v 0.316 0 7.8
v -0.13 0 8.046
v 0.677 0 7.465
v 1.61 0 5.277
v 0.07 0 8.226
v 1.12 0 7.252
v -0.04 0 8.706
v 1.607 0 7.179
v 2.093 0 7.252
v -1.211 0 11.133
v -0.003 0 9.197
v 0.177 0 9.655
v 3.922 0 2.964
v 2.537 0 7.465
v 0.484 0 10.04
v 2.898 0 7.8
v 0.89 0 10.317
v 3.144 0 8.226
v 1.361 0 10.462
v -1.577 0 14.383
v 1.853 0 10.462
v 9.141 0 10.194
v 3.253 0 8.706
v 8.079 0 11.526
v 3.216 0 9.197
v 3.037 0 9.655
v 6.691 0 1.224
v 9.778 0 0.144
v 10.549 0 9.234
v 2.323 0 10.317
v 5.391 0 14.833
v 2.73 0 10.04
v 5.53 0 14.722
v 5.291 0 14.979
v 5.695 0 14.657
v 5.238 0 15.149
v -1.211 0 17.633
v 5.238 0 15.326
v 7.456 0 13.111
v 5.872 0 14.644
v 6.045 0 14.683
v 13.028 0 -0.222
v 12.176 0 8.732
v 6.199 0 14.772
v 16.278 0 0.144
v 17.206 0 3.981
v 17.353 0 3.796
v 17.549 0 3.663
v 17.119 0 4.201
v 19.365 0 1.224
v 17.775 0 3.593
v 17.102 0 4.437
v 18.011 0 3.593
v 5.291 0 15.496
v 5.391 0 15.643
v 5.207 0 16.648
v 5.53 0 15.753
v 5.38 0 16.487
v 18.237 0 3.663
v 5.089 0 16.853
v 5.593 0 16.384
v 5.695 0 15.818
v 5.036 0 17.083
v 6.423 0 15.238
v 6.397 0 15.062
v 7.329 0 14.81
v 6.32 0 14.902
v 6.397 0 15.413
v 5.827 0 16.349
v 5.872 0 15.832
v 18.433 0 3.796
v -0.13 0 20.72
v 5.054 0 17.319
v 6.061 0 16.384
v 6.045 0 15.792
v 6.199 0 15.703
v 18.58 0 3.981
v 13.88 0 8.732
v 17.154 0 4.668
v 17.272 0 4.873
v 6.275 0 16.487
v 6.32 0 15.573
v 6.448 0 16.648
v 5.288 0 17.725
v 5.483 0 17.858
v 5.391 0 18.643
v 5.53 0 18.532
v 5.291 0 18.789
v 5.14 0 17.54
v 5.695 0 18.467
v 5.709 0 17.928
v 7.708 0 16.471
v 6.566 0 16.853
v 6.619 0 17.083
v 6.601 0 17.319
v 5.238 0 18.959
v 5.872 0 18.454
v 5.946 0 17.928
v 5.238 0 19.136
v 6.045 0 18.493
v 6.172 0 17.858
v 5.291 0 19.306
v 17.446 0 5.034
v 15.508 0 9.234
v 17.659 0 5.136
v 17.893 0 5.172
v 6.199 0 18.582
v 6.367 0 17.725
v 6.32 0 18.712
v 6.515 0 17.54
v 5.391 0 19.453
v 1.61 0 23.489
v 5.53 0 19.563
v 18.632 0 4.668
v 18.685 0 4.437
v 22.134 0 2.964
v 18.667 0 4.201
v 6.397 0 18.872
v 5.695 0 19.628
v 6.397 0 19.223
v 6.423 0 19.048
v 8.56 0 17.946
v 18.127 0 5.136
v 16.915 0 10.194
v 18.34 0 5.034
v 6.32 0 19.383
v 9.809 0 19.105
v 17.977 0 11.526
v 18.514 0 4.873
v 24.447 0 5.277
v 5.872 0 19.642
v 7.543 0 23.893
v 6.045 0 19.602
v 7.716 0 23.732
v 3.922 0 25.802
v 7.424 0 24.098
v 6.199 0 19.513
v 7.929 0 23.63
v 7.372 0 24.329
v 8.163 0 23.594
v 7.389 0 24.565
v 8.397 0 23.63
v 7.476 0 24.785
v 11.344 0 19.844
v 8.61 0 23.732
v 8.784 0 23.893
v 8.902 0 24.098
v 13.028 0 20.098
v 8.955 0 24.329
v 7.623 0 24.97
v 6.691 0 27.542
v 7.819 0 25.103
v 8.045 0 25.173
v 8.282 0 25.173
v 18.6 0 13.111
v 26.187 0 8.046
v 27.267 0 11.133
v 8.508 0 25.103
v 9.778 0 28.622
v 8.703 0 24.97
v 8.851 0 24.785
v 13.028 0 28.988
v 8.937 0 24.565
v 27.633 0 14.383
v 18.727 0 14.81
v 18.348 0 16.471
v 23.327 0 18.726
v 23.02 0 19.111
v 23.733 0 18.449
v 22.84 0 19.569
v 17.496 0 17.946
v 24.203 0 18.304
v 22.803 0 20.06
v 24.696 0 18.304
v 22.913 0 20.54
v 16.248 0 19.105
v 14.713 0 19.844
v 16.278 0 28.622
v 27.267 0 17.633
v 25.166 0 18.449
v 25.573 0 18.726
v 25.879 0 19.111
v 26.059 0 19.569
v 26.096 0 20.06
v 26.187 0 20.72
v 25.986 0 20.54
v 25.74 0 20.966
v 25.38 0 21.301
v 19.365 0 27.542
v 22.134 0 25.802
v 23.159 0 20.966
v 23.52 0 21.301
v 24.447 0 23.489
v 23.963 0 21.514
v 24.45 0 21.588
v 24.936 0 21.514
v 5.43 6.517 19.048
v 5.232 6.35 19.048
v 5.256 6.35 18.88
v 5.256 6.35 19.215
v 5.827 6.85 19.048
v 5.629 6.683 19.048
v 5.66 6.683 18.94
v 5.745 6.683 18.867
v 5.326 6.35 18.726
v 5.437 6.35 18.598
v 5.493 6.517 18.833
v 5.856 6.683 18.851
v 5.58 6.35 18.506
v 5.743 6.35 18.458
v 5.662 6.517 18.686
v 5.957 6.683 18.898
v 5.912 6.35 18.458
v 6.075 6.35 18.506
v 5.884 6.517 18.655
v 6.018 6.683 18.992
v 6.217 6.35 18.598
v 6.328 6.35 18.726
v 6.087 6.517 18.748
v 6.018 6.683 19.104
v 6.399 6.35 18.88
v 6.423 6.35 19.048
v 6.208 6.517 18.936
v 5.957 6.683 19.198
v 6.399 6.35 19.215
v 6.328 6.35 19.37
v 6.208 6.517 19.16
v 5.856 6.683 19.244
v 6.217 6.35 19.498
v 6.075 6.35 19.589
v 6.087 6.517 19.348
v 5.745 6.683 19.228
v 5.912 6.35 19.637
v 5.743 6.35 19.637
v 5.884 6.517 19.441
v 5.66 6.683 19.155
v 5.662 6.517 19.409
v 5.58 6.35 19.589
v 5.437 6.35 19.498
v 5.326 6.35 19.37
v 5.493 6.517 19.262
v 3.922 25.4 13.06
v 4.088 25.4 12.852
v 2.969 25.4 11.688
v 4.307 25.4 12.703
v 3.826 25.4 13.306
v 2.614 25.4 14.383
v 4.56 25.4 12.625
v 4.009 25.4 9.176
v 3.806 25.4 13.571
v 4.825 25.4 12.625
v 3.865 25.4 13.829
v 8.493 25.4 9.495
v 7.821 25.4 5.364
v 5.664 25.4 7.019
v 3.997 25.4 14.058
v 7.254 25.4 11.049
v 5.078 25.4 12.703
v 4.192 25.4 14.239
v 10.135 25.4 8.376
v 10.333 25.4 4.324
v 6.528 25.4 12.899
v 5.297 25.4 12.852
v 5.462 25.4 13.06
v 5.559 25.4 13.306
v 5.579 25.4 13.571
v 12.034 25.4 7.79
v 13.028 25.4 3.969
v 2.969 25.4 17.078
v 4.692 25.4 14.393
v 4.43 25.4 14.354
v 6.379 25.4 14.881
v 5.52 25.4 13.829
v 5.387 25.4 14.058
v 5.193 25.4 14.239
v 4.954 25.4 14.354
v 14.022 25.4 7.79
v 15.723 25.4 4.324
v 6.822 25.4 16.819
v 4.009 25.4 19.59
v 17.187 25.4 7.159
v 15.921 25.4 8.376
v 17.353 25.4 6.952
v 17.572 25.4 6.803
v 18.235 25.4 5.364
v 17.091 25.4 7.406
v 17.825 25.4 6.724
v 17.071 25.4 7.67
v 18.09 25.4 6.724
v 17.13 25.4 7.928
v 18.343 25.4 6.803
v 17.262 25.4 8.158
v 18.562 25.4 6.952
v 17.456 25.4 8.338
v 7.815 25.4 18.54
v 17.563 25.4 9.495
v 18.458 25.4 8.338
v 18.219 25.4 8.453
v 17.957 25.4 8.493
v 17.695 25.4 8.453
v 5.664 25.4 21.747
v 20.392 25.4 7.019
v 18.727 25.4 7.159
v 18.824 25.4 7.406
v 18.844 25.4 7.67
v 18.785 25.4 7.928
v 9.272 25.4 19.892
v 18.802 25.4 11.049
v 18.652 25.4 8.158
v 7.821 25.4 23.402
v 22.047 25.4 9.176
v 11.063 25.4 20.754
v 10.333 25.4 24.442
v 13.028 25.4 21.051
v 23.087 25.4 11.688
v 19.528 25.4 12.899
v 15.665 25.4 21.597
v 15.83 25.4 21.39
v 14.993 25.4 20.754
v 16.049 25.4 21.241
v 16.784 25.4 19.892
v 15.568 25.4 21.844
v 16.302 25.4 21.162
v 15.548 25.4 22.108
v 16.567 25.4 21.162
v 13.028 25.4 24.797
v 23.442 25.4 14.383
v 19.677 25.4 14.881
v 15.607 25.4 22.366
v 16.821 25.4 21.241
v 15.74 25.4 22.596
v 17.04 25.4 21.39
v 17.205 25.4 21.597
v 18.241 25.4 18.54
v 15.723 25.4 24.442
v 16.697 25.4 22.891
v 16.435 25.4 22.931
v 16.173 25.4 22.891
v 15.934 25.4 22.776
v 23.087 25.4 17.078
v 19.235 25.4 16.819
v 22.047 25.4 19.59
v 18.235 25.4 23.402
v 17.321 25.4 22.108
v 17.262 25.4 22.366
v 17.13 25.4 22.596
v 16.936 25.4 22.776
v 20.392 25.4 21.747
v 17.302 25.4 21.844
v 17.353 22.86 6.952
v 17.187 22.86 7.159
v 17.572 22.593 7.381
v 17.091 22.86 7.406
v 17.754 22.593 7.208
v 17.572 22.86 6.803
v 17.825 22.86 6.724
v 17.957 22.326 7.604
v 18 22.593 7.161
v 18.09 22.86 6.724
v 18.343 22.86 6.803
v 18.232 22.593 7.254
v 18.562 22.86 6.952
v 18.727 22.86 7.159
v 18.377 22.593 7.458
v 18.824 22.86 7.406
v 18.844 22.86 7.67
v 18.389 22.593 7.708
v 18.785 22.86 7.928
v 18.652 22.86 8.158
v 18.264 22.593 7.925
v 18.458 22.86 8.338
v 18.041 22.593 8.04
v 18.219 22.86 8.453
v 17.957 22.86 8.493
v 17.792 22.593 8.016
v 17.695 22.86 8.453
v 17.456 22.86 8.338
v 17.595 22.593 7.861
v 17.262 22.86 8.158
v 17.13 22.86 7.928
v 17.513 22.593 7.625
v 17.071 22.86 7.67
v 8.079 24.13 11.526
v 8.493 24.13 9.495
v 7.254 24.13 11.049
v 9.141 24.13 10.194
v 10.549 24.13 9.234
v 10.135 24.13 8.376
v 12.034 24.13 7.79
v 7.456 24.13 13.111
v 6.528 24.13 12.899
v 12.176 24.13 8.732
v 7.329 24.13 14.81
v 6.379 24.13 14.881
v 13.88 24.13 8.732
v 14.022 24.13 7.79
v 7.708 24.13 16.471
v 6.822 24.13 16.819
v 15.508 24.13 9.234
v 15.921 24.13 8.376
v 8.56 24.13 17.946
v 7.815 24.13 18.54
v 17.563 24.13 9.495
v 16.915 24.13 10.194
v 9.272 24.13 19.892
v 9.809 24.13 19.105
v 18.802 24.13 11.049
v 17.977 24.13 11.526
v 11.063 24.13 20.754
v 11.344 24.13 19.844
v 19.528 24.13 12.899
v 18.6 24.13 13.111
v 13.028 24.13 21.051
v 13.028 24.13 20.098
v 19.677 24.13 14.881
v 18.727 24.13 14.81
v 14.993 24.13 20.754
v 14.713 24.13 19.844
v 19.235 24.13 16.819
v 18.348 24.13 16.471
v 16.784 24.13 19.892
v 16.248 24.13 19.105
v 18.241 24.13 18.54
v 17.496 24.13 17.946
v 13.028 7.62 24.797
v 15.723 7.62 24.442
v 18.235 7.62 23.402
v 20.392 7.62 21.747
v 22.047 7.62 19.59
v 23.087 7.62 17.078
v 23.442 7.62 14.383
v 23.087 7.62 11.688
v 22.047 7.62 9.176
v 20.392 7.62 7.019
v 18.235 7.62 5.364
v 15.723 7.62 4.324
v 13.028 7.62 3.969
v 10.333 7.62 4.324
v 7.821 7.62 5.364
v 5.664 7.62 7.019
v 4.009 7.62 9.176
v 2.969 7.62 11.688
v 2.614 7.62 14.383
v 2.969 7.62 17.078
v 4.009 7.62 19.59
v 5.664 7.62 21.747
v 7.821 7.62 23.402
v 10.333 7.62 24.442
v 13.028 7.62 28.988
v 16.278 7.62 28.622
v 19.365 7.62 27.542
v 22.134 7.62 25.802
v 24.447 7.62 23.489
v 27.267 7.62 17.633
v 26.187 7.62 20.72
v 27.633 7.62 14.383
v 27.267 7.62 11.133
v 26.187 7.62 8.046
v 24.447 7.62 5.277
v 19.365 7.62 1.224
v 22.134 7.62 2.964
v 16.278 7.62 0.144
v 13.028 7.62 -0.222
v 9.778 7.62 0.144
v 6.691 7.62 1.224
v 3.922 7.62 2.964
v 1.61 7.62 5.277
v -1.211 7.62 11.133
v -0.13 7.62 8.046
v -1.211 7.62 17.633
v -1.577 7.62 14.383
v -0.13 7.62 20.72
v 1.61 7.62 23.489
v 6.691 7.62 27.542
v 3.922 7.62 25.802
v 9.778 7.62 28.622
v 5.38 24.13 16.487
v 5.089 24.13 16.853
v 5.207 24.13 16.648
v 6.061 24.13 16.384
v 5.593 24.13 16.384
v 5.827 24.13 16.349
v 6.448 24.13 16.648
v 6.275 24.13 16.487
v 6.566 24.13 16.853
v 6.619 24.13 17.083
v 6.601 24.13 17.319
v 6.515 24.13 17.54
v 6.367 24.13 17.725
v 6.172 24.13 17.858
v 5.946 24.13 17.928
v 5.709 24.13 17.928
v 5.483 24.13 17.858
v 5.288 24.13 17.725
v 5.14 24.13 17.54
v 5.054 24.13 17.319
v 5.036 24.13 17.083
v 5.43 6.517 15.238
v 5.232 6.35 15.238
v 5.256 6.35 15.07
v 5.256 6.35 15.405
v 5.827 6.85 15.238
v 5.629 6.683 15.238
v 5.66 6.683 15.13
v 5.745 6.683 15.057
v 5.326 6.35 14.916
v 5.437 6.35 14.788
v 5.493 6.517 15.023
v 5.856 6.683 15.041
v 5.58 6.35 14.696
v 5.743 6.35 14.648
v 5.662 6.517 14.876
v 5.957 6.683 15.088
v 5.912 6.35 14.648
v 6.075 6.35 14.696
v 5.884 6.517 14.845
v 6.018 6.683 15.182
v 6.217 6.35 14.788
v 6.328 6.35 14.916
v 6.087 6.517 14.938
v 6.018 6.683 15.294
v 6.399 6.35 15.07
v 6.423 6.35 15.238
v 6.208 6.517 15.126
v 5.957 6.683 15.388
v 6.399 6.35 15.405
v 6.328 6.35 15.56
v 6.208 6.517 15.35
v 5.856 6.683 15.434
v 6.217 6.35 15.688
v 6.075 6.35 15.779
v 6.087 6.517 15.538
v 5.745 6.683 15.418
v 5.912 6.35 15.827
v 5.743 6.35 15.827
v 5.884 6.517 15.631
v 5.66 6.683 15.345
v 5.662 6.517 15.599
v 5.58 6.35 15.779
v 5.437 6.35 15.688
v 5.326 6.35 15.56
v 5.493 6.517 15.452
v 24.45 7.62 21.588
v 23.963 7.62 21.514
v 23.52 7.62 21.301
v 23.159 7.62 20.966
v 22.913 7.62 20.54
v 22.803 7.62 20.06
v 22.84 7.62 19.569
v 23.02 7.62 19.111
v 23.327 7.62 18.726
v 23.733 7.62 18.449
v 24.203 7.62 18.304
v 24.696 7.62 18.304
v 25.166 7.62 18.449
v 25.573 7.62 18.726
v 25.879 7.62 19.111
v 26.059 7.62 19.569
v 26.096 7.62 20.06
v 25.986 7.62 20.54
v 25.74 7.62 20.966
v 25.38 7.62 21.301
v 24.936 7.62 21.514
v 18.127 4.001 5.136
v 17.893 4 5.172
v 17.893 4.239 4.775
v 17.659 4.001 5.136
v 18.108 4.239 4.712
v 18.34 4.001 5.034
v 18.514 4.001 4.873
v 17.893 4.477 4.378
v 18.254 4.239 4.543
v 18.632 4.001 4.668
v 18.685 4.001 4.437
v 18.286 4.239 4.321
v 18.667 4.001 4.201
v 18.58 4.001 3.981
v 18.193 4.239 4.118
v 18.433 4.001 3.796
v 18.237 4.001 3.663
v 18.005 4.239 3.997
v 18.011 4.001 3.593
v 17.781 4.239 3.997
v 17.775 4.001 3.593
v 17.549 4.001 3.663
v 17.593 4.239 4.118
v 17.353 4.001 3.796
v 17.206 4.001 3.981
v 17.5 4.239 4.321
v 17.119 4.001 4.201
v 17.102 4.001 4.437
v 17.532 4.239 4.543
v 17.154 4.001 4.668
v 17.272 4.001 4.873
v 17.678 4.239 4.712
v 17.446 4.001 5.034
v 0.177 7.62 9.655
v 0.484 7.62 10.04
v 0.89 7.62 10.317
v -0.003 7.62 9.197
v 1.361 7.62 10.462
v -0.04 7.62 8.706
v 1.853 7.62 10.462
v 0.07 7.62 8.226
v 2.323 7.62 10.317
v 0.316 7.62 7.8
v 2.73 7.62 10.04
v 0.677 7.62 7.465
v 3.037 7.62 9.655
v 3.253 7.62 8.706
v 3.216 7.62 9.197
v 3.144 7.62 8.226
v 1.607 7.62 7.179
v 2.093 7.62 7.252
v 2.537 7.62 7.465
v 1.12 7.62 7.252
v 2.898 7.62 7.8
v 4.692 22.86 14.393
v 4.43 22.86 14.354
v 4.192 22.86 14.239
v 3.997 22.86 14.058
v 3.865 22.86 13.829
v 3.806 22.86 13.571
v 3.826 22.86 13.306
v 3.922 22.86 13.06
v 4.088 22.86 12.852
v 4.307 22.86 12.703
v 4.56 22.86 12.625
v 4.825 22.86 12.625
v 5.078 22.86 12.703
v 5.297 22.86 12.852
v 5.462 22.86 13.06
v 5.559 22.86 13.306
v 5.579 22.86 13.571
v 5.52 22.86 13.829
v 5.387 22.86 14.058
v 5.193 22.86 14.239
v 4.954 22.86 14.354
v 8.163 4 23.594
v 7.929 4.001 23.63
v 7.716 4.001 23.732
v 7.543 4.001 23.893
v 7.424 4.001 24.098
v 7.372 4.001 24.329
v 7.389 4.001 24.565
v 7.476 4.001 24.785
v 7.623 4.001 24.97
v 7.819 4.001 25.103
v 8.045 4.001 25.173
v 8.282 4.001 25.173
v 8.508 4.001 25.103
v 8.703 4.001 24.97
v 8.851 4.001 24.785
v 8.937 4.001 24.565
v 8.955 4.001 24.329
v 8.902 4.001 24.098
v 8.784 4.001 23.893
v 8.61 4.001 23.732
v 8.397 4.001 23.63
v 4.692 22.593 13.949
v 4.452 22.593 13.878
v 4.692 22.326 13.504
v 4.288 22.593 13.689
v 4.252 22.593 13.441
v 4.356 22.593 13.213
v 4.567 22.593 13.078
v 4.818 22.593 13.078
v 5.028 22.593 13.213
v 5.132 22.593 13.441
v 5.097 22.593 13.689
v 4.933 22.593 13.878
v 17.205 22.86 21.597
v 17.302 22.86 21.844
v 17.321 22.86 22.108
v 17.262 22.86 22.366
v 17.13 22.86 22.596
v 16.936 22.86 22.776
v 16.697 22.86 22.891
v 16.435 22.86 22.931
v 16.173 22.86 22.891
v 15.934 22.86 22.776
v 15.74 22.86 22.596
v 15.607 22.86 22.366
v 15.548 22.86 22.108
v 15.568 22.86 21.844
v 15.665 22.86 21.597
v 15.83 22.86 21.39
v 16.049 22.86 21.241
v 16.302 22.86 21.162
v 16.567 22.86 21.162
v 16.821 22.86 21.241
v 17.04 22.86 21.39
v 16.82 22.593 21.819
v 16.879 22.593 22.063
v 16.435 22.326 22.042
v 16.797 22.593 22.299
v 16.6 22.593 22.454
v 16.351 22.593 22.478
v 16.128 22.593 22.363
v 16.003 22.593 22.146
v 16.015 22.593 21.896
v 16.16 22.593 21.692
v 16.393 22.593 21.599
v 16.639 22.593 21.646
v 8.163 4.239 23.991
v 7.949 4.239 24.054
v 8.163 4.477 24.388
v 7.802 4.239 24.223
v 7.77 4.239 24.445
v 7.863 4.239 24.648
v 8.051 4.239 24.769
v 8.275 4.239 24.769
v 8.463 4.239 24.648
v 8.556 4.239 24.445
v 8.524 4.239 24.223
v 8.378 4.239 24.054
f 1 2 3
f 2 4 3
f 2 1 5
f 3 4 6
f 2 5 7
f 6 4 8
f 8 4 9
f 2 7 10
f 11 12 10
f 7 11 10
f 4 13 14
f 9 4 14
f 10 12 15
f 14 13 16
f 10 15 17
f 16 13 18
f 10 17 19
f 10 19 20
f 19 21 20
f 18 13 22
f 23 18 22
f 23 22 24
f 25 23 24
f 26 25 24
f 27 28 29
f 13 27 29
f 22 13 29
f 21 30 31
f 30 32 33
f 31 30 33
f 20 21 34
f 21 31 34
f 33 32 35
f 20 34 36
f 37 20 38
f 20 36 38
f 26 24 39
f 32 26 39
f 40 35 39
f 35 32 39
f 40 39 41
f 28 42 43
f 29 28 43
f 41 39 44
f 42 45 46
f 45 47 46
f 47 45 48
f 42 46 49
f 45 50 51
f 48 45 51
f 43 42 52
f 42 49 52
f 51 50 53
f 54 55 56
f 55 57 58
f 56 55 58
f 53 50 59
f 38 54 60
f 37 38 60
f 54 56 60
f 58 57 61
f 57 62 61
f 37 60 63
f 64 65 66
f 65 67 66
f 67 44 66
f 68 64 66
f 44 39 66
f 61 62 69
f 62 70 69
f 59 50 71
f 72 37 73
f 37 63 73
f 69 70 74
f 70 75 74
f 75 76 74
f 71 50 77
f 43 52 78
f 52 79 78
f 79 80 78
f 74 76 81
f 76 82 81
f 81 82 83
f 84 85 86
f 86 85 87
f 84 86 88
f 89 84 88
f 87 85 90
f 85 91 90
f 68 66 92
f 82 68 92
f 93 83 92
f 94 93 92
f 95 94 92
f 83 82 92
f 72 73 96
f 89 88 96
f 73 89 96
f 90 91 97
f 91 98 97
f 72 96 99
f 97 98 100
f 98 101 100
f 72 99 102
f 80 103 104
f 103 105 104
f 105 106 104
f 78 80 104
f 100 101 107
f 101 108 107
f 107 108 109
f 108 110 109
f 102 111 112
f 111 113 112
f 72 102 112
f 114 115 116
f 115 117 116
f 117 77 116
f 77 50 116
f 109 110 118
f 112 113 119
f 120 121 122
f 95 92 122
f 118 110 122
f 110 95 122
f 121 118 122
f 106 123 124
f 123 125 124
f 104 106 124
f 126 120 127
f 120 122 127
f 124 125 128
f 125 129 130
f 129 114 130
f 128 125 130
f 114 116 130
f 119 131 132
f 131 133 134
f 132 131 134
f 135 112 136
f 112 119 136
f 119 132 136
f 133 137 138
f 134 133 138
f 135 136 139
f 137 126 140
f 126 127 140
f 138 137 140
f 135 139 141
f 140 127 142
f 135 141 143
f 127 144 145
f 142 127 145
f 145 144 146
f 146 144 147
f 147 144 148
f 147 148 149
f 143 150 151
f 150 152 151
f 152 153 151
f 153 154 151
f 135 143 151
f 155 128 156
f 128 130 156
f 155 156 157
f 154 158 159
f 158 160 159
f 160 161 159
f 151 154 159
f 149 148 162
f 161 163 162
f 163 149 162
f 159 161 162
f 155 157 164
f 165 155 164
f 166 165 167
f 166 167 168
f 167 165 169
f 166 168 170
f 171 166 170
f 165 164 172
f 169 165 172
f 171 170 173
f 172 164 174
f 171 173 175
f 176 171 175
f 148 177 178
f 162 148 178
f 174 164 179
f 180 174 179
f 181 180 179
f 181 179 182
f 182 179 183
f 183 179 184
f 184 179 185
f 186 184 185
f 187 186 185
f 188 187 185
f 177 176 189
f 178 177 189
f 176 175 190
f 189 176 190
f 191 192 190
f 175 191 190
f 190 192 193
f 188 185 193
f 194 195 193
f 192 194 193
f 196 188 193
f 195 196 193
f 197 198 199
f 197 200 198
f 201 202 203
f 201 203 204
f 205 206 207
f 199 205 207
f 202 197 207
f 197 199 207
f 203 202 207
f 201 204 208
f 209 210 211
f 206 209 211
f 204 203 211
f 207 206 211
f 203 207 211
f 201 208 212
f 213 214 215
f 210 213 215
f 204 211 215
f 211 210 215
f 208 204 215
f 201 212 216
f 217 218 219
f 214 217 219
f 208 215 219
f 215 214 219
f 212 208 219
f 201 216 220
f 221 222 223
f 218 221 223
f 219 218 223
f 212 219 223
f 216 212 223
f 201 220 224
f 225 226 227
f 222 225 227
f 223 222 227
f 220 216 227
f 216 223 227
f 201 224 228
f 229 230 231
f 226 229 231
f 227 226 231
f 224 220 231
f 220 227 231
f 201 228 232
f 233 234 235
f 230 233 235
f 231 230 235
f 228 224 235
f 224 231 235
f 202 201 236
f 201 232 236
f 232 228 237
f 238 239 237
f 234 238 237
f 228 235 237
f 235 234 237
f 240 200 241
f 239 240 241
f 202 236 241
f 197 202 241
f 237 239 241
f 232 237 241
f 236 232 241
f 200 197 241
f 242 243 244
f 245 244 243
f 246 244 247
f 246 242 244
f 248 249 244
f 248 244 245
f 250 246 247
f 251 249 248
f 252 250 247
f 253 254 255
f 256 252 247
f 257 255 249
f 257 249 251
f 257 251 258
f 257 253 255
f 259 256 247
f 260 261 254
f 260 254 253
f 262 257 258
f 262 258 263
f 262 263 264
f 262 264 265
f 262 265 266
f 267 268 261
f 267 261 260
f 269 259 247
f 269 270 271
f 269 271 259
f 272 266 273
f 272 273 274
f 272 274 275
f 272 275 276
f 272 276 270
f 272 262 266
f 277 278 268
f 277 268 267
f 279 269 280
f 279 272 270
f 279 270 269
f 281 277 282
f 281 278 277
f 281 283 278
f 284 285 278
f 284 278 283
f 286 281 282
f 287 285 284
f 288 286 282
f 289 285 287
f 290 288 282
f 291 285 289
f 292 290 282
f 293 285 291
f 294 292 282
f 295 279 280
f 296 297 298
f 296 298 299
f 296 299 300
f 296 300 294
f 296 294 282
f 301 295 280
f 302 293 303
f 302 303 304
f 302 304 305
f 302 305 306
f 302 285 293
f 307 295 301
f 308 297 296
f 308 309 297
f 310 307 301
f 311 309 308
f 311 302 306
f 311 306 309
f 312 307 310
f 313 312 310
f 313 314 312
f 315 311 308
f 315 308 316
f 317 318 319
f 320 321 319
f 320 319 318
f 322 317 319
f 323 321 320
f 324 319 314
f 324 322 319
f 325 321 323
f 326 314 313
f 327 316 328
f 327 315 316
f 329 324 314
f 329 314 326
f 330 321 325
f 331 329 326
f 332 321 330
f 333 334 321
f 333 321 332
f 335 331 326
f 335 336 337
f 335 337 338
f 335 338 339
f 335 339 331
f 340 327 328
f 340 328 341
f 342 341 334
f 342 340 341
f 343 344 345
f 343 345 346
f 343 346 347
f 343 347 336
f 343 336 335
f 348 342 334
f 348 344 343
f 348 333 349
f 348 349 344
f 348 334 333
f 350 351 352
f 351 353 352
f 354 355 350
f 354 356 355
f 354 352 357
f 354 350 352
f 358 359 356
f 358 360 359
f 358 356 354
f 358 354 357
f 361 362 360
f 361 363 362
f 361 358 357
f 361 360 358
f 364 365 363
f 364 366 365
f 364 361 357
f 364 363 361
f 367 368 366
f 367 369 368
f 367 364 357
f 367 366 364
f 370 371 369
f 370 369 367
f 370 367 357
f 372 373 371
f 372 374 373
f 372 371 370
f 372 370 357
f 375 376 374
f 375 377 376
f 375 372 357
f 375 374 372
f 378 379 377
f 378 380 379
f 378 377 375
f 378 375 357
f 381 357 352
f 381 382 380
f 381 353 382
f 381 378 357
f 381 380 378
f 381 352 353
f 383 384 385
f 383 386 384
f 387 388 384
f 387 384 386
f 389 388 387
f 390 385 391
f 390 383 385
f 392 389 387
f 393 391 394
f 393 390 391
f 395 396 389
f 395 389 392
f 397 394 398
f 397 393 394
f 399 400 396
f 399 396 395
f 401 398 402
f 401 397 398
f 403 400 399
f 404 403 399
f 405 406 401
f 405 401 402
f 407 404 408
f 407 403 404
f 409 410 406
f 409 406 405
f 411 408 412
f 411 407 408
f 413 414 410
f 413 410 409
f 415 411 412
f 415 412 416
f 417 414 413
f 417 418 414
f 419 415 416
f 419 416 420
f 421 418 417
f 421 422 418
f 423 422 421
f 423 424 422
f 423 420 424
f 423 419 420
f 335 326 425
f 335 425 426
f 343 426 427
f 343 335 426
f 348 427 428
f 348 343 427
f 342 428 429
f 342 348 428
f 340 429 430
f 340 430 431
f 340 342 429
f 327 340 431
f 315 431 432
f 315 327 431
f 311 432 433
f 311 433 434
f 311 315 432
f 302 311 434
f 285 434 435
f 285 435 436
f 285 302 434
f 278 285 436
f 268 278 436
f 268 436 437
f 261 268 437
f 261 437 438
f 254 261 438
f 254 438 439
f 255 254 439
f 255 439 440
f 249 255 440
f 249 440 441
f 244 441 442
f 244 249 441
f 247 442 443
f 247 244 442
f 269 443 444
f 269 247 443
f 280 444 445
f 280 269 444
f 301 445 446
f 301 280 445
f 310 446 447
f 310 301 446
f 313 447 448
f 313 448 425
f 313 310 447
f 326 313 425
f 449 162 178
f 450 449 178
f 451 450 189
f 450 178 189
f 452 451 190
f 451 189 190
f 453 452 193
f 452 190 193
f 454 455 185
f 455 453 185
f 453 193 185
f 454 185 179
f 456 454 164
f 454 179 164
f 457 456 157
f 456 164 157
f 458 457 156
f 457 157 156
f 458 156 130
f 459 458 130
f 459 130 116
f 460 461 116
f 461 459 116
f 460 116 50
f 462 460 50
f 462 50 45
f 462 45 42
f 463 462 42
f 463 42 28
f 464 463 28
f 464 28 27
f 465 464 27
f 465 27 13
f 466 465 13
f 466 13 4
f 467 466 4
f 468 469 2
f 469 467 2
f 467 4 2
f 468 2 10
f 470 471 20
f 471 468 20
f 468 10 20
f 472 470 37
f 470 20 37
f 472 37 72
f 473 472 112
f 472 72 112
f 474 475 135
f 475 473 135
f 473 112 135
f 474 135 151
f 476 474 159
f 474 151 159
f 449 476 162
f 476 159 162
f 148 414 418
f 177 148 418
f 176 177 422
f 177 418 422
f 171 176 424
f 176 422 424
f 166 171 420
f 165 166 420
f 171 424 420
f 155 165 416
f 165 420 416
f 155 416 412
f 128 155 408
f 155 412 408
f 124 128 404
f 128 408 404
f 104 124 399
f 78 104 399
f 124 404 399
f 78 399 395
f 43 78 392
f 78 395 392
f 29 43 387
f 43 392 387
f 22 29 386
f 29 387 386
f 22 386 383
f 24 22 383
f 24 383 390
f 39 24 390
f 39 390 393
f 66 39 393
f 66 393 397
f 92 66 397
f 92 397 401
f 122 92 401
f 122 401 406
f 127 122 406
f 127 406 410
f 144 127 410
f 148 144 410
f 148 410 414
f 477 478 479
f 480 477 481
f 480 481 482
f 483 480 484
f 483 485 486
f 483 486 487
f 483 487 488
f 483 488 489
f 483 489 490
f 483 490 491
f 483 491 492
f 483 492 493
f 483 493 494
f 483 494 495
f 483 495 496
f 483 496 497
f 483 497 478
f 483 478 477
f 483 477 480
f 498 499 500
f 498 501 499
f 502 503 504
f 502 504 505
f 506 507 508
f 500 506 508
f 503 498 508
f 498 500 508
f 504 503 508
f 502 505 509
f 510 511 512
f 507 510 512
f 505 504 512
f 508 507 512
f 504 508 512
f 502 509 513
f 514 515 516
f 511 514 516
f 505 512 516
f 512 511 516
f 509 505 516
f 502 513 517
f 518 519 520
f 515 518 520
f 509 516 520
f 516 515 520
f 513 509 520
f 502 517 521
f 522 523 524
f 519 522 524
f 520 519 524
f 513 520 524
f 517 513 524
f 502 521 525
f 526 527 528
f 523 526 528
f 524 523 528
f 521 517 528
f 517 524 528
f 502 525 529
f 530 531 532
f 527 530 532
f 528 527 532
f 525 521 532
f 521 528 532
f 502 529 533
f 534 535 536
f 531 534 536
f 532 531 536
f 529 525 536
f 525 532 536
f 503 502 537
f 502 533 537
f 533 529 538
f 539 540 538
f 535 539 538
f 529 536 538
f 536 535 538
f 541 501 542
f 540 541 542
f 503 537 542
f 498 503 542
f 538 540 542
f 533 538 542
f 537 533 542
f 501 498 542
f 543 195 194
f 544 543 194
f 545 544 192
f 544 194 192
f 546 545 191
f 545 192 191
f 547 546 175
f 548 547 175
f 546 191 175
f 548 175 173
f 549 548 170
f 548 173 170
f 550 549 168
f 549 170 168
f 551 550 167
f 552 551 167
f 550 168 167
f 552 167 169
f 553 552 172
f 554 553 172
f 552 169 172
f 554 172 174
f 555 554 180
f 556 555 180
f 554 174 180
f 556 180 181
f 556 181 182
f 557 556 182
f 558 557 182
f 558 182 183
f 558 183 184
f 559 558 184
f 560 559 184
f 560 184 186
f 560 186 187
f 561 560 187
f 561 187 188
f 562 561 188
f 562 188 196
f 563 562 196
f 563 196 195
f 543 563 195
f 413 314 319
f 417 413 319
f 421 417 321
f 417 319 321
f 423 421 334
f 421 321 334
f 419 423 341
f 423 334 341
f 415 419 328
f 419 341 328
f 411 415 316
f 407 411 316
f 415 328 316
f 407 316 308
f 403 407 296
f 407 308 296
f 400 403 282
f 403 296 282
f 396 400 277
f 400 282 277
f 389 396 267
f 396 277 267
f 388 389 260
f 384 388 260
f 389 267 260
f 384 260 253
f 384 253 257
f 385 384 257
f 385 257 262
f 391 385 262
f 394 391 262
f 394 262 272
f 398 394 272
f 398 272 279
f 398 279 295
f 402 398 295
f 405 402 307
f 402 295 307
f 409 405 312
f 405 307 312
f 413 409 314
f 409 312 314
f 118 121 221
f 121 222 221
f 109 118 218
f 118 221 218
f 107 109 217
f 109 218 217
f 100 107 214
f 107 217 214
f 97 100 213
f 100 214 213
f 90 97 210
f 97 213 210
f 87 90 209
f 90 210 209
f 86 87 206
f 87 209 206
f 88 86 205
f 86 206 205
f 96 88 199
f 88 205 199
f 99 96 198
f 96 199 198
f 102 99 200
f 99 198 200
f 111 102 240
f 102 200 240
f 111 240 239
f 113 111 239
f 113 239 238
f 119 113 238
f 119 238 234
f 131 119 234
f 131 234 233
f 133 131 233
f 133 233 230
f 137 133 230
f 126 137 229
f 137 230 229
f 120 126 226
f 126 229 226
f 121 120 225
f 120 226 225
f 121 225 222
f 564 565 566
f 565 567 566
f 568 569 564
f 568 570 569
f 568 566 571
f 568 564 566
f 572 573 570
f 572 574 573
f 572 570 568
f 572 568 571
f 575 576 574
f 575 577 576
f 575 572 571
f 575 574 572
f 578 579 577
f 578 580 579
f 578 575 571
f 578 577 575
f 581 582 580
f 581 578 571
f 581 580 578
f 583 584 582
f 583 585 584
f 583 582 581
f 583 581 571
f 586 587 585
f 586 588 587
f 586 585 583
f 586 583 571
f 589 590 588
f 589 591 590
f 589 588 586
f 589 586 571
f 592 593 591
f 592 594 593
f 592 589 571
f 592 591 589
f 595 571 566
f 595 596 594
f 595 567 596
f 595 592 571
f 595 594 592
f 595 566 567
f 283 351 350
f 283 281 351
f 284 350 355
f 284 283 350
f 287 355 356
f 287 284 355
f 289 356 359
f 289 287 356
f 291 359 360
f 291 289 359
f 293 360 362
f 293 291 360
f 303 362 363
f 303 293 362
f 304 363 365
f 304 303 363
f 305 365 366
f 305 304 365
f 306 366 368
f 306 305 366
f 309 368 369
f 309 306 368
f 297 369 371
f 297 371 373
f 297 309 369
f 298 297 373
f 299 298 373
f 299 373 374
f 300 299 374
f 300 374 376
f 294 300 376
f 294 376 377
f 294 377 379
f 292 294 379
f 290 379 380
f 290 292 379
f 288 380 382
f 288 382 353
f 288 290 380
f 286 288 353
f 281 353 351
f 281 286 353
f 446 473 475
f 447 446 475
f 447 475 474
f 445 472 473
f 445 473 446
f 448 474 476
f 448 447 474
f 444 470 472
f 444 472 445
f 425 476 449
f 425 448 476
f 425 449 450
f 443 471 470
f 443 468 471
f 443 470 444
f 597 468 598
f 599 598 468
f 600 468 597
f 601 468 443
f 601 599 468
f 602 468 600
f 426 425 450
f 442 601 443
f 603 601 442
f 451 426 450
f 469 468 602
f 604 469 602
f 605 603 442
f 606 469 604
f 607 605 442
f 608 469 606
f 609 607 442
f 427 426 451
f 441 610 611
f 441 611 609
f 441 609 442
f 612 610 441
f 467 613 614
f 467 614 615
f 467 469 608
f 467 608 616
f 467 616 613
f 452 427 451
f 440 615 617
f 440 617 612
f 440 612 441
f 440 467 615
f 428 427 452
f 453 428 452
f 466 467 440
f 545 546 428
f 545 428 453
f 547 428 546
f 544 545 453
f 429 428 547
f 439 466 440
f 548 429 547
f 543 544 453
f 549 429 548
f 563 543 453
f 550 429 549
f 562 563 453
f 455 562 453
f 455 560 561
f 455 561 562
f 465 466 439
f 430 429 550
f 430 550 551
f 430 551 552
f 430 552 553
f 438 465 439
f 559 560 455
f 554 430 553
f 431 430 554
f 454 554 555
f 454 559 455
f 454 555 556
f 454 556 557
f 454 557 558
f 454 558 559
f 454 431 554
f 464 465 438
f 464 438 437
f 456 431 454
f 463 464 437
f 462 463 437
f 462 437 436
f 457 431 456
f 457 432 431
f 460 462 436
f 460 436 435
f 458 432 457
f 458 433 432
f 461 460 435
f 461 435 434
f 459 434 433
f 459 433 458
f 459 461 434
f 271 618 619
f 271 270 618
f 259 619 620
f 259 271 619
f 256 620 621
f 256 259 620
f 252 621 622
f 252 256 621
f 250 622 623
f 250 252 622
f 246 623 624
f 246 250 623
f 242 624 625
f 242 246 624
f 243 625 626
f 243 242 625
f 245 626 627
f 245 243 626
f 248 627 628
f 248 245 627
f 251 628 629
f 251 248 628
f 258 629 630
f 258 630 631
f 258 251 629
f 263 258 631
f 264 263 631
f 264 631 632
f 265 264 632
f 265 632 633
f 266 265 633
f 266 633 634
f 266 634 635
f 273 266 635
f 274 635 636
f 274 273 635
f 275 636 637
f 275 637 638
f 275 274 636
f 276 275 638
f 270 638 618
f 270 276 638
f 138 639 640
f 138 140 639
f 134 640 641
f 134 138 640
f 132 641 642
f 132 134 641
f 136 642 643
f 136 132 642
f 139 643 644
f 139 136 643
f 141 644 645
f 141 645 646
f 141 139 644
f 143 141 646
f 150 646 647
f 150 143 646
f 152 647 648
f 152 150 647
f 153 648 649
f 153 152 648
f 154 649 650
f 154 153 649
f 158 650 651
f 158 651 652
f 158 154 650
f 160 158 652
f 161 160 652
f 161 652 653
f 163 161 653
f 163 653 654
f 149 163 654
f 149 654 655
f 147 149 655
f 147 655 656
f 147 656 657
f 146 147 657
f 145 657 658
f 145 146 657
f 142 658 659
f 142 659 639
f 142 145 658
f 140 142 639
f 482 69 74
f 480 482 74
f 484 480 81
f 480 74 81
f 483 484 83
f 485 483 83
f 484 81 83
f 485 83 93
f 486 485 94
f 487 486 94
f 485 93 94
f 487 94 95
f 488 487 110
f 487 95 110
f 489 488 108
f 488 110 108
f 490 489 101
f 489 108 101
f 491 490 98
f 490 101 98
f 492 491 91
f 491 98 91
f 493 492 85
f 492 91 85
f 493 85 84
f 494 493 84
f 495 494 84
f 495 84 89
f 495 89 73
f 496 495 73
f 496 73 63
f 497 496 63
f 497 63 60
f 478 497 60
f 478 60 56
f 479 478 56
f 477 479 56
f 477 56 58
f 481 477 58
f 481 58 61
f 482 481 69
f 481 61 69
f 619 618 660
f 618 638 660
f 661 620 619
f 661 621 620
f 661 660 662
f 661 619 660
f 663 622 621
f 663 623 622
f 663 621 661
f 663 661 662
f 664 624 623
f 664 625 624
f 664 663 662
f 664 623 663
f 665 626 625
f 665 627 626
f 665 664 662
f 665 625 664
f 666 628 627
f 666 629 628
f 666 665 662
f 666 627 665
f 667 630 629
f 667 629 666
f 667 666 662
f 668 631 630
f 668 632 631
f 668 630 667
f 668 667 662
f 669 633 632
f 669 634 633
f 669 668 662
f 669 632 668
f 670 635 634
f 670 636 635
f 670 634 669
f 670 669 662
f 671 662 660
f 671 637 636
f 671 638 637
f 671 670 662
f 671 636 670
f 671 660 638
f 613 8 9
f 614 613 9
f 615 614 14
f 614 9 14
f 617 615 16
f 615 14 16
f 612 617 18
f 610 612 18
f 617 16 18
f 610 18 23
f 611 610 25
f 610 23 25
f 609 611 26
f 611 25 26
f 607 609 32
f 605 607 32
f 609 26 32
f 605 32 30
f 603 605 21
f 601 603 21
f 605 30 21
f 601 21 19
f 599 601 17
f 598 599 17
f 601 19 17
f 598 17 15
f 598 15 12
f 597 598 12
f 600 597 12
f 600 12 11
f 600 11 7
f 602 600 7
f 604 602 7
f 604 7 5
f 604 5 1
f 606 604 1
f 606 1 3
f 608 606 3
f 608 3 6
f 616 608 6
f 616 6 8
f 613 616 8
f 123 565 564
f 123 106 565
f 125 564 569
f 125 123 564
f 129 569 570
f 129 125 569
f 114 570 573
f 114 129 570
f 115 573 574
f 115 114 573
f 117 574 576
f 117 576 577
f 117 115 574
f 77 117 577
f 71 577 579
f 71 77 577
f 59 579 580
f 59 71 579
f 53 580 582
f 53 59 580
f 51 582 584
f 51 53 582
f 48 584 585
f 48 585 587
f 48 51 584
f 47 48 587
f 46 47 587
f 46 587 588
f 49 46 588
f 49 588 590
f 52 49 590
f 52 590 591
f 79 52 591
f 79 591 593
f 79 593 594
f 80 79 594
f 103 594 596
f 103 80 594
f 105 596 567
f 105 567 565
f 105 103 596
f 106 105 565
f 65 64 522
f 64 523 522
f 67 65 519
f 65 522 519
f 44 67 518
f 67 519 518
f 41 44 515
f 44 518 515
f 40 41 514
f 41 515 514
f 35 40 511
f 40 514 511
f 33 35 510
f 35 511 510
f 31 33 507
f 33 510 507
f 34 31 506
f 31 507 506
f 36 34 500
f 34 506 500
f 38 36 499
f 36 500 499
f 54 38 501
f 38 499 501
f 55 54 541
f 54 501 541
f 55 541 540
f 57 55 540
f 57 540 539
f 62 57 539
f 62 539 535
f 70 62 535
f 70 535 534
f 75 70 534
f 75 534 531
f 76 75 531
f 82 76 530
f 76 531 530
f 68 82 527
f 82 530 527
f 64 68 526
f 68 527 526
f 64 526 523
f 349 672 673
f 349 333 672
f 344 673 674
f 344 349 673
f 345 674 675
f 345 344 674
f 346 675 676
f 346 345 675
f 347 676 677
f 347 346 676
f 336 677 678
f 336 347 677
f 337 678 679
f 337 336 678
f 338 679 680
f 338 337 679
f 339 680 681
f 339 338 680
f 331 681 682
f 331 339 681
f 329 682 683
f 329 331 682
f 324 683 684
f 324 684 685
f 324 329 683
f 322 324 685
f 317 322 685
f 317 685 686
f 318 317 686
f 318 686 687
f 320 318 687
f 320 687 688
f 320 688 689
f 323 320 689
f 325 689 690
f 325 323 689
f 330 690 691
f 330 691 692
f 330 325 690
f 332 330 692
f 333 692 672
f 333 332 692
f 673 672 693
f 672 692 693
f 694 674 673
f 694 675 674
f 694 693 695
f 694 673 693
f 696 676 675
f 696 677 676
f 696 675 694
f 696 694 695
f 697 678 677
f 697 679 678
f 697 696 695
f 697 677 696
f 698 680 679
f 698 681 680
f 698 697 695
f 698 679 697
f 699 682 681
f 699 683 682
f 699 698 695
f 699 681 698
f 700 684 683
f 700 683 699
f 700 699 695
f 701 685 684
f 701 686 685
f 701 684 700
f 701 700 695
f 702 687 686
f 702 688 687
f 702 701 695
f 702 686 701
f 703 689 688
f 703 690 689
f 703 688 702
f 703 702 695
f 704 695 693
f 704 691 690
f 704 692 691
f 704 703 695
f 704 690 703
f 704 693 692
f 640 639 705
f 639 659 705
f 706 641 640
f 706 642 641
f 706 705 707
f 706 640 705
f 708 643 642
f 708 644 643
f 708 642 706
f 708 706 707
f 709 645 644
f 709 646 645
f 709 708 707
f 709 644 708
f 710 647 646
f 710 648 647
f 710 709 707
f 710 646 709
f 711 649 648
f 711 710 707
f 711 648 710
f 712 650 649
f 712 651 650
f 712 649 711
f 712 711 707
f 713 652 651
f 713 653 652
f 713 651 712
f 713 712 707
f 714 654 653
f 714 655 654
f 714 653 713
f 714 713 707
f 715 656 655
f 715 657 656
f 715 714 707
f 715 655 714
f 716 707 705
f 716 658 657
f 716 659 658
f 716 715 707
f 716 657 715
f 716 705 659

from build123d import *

# Parameters (mm, degrees)
SKETCH1_R                     = 14.605
BOSS_EXTRUDE2_DEPTH           = 25.4
SKETCH10_R                    = 5.715
CUT_EXTRUDE5_DEPTH            = 48.424233935
SKETCH11_R                    = 6.6675
CUT_EXTRUDE6_DEPTH            = 1.27
SKETCH12_OUTSIDE_W            = 40.908
SKETCH12_OUTSIDE_H            = 40.908
SKETCH12_OUTSIDE_R            = 10.414
CUT_EXTRUDE7_DEPTH            = 17.78
CIRPATTERN1_COUNT             = 3
CIRPATTERN2_COUNT             = 2
SKETCH26_R                    = 1.651
CUT_EXTRUDE8_DEPTH            = 8.89
CIRPATTERN3_COUNT             = 2
SKETCH27_R                    = 0.79375
CUT_EXTRUDE9_DEPTH            = 24.13
TAP_DRILL_FOR_0_80_TAP3_D     = 1.19126
TAP_DRILL_FOR_0_80_TAP3_DEPTH = 6.35
TAP_DRILL_FOR_0_80_TAP3_TIP   = 0.499792913


with BuildPart() as part:
    # Sketch1 → Boss-Extrude2 (new body)
    with BuildSketch(Plane(origin=(0, 0, 0), x_dir=(1, 0, 0), z_dir=(0, 1, 0))):
        with Locations(Location((13.028153923, -14.383045271, 0), (0, 0, 270))):
            Circle(SKETCH1_R)
    extrude(amount=BOSS_EXTRUDE2_DEPTH)

    # Sketch10 → Cut-Extrude5 (cut, through all)
    with BuildSketch(Plane(origin=(0, 25.4, 0), x_dir=(1, 0, 0), z_dir=(0, 1, 0))):
        with Locations(Location((13.028153923, -14.383045271, 0), (0, 0, 270))):
            Circle(SKETCH10_R)
    extrude(amount=-CUT_EXTRUDE5_DEPTH, mode=Mode.SUBTRACT)

    # Sketch11 → Cut-Extrude6 (cut)
    with BuildSketch(Plane(origin=(0, 25.4, 0), x_dir=(1, 0, 0), z_dir=(0, 1, 0))):
        with Locations(Location((13.028153923, -14.383045271, 0), (0, 0, 270))):
            Circle(SKETCH11_R)
    extrude(amount=-CUT_EXTRUDE6_DEPTH, mode=Mode.SUBTRACT)

    # Sketch12 outside → Cut-Extrude7 (cut)
    with BuildSketch(Plane(origin=(0, 25.4, 0), x_dir=(1, 0, 0), z_dir=(0, 1, 0))):
        with Locations((13.028, -14.383)):
            Rectangle(SKETCH12_OUTSIDE_W, SKETCH12_OUTSIDE_H)
        with Locations(Location((13.028153923, -14.383045271, 0), (0, 0, 270))):
            Circle(SKETCH12_OUTSIDE_R, mode=Mode.SUBTRACT)
    extrude(amount=-CUT_EXTRUDE7_DEPTH, mode=Mode.SUBTRACT)

    # Sketch17 → #50 (0.07) Diameter Hole1 (revolve, cut)
    with BuildSketch(Plane(origin=(4.692367215, 25.4, 13.504077717), x_dir=(0, 0, 1), z_dir=(1, 0, 0))):
        Polygon((0, 0), (0, 3.07416509), (0.889, 2.54), (0.889, 0), align=None)
    f_50_0_07_diameter_hole1 = revolve(axis=Axis((4.692367215, 31.75, 13.504077717), (0, -1, 0)), mode=Mode.SUBTRACT)

    # CirPattern1: #50 (0.07) Diameter Hole1 ×3 about axis
    cirpattern1_axis = Axis((13.028153923, 0, 14.383045271), (0, 1, 0))
    for i in range(1, CIRPATTERN1_COUNT):
        add(f_50_0_07_diameter_hole1.rotate(cirpattern1_axis, i * 360 / CIRPATTERN1_COUNT), mode=Mode.SUBTRACT)

    # Sketch24 → 1/16 (0.0625) Diameter Hole2 (revolve, cut)
    with BuildSketch(Plane(origin=(8.163266455, 0, 24.388191195), x_dir=(0, 0, -1), z_dir=(1, 0, 0))):
        Polygon((0, 0), (0, 4.477433116), (0.79375, 4.0005), (0.79375, 0), align=None)
    f_1_16_0_0625_diameter_hole2 = revolve(axis=Axis((8.163266455, -6.35, 24.388191195), (0, 1, 0)), mode=Mode.SUBTRACT)

    # CirPattern2: 1/16 (0.0625) Diameter Hole2 ×2 about axis
    cirpattern2_axis = Axis((13.028153923, 0, 14.383045271), (0, 1, 0))
    for i in range(1, CIRPATTERN2_COUNT):
        add(f_1_16_0_0625_diameter_hole2.rotate(cirpattern2_axis, i * 360 / CIRPATTERN2_COUNT), mode=Mode.SUBTRACT)

    # Sketch26 → Cut-Extrude8 (cut)
    with BuildSketch(Plane(origin=(0, 0, 0), x_dir=(-1, 0, 0), z_dir=(0, -1, 0))):
        with Locations(Location((-1.606754466, -8.829520764, 0), (0, 0, 90))):
            Circle(SKETCH26_R)
    cut_extrude8 = extrude(amount=-CUT_EXTRUDE8_DEPTH, mode=Mode.SUBTRACT)

    # CirPattern3: Cut-Extrude8 ×2 about axis
    cirpattern3_axis = Axis((13.028153923, 0, 14.383045271), (0, 1, 0))
    for i in range(1, CIRPATTERN3_COUNT):
        add(cut_extrude8.rotate(cirpattern3_axis, i * 360 / CIRPATTERN3_COUNT), mode=Mode.SUBTRACT)

    # Sketch27 → Cut-Extrude9 (cut)
    with BuildSketch(Plane(origin=(0, 0, 0), x_dir=(-1, 0, 0), z_dir=(0, -1, 0))):
        with Locations(Location((-5.827402564, -17.142659866, 0), (0, 0, 90))):
            Circle(SKETCH27_R)
    extrude(amount=-CUT_EXTRUDE9_DEPTH, mode=Mode.SUBTRACT)

    # Tap Drill for #0-80 Tap3
    with Locations(Plane(origin=(0, 0, 0), x_dir=(-1, 0, 0), z_dir=(0, -1, 0))):
        with Locations((-5.827402564, -15.237659866), (-5.827402564, -19.047659866)):
            Hole(TAP_DRILL_FOR_0_80_TAP3_D / 2, depth=TAP_DRILL_FOR_0_80_TAP3_DEPTH)
            with Locations((0, 0, -(TAP_DRILL_FOR_0_80_TAP3_DEPTH + TAP_DRILL_FOR_0_80_TAP3_TIP / 2))):  # 100° drill point
                Cone(0, TAP_DRILL_FOR_0_80_TAP3_D / 2, TAP_DRILL_FOR_0_80_TAP3_TIP, mode=Mode.SUBTRACT)


solid = part.part
